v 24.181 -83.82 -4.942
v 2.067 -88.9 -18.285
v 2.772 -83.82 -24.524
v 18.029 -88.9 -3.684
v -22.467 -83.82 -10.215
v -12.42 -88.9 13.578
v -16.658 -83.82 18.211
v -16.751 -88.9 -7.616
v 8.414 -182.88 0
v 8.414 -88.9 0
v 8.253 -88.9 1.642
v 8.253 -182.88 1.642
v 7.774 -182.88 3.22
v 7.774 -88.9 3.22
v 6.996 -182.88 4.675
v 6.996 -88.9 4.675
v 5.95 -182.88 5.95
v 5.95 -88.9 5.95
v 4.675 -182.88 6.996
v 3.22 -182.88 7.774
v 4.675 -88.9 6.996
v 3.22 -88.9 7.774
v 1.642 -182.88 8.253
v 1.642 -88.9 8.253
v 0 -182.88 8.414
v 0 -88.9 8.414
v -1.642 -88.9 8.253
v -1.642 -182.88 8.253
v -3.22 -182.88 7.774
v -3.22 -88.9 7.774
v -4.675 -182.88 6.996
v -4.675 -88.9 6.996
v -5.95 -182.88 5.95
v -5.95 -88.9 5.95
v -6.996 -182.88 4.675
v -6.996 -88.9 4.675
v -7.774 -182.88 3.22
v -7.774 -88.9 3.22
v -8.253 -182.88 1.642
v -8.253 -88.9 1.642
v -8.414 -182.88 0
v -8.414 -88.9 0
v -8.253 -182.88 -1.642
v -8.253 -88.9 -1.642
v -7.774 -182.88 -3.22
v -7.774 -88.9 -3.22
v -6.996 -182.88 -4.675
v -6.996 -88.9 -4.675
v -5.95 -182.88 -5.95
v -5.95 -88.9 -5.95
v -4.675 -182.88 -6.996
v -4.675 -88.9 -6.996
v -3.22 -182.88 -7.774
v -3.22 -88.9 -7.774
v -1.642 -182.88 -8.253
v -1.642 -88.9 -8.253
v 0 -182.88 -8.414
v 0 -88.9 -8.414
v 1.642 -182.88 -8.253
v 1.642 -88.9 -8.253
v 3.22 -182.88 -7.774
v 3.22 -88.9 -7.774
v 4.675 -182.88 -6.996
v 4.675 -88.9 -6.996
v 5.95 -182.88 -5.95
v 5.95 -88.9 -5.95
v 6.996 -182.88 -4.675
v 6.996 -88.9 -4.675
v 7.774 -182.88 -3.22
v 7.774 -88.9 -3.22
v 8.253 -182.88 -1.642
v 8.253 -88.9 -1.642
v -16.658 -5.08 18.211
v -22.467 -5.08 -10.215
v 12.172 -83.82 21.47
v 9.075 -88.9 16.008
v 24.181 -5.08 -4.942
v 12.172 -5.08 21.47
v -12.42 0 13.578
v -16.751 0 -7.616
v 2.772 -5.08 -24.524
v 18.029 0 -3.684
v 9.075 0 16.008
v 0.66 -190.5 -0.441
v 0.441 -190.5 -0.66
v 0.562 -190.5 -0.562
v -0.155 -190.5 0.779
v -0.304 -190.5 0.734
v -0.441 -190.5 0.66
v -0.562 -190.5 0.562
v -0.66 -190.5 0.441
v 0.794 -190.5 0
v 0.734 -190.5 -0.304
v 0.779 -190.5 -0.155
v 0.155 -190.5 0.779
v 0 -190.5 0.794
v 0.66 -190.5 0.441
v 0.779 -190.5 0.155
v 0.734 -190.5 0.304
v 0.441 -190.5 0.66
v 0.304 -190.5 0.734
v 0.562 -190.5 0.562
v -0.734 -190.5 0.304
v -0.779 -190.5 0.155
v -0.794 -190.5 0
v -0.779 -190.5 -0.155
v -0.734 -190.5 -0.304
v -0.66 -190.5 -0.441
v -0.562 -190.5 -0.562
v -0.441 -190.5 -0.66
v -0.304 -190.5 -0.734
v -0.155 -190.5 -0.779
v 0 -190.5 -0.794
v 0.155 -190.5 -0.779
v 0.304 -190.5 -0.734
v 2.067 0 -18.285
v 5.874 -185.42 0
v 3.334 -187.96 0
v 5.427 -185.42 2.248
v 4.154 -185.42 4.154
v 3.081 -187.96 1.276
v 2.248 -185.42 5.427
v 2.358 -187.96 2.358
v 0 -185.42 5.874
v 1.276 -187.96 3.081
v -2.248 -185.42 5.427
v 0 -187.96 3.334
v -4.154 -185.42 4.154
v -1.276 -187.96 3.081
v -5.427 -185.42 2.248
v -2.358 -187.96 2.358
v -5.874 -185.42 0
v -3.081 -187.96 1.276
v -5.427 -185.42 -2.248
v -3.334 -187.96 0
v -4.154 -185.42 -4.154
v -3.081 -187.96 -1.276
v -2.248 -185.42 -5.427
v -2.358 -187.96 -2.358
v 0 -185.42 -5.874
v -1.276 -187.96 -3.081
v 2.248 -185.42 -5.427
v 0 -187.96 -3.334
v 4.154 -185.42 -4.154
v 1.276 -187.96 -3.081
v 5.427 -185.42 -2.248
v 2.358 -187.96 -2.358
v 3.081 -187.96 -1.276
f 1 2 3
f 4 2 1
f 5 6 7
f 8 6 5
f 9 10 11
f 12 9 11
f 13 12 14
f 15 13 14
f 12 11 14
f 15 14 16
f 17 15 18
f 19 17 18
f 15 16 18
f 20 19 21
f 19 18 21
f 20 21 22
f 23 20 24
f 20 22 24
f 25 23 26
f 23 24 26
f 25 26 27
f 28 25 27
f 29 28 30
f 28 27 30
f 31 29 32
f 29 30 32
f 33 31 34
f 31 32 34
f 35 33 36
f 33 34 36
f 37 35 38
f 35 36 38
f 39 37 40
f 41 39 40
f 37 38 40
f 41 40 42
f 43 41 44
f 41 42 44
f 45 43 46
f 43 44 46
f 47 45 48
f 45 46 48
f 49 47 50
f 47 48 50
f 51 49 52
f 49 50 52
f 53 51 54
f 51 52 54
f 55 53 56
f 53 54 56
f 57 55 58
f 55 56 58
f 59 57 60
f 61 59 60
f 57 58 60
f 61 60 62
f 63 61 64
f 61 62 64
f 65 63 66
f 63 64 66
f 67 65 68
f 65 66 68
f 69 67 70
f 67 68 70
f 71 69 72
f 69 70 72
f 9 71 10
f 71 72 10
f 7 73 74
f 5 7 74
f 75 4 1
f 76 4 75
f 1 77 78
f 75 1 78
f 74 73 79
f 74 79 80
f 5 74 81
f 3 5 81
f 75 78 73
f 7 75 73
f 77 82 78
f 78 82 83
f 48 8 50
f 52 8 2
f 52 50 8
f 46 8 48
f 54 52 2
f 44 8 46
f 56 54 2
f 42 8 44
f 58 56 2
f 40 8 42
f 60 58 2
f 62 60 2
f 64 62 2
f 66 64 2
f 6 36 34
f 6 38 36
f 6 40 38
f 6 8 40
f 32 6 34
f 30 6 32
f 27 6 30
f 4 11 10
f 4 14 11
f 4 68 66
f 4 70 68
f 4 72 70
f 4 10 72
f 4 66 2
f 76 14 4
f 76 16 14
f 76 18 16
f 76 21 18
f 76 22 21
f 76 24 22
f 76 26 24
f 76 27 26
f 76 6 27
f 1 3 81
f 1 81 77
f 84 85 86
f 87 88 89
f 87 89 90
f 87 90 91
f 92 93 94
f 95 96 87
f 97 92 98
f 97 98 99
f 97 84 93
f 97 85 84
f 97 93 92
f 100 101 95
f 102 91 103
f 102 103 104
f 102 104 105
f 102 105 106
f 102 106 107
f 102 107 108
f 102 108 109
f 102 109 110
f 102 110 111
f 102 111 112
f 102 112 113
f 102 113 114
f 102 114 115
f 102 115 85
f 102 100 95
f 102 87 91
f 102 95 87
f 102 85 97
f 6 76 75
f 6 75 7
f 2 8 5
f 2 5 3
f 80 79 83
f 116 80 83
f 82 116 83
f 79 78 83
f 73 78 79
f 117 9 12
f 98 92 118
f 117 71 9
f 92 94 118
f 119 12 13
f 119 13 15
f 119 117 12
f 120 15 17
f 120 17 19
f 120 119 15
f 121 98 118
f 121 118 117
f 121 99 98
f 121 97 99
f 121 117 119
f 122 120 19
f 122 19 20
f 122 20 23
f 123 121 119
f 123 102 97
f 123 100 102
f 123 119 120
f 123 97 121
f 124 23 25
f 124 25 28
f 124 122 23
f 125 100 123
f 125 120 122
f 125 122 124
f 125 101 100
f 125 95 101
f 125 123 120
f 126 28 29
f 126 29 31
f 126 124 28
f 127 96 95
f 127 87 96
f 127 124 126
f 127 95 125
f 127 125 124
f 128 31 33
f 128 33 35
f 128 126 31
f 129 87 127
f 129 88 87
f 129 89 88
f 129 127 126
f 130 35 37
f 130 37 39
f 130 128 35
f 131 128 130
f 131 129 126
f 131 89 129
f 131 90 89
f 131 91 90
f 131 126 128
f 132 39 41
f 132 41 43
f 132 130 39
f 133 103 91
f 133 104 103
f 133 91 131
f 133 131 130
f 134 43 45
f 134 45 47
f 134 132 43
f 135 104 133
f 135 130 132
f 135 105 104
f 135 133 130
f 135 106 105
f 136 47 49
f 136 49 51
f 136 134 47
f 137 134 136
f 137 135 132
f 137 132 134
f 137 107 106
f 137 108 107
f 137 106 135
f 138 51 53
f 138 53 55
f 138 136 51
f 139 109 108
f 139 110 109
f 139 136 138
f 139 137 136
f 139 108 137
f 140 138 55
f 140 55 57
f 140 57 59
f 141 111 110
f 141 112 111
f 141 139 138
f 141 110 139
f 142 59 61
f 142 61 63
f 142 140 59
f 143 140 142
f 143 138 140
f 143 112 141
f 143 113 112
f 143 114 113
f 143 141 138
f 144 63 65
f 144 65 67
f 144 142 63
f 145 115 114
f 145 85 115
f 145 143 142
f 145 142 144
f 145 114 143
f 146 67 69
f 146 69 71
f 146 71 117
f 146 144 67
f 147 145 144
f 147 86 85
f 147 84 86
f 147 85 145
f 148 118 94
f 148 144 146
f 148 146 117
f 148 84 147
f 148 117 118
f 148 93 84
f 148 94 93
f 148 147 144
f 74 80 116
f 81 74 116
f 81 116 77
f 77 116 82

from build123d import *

# Parameters (mm, degrees)
F1_DEPTH = 88.9
F2_SIZE  = 5.08
F3_SIZE  = 5.08
F4_SIZE  = 5.08
F5_SIZE  = 5.08
F6_SIZE  = 5.08
F7_SIZE  = 5.08
F8_R     = 8.414365
F9_DEPTH = 101.6
F10_SIZE = 7.62


with BuildPart() as f1:
    # F0 (on Front) → F1 (new body)
    with BuildSketch(Plane.XZ):
        Polygon((-22.467206, -10.215149), (2.772436, -24.524237), (24.180665, -4.941663), (12.172037, 21.470121), (-16.657933, 18.210928), align=None)
    extrude(amount=F1_DEPTH)

    # F2
    f2_edges = [f1.edges().sort_by_distance(p)[0] for p in [
        (-9.847385, -88.9, -17.369693),
    ]]
    chamfer(f2_edges, length=F2_SIZE)

    # F3
    f3_edges = [f1.edges().sort_by_distance(p)[0] for p in [
        (-19.027823, -88.9, 6.614521),
    ]]
    chamfer(f3_edges, length=F3_SIZE)

    # F4
    f4_edges = [f1.edges().sort_by_distance(p)[0] for p in [
        (0.410862, -88.9, 20.140535),
    ]]
    chamfer(f4_edges, length=F4_SIZE)

    # F5
    f5_edges = [f1.edges().sort_by_distance(p)[0] for p in [
        (19.28175, -88.9, 5.833014),
    ]]
    chamfer(f5_edges, length=F5_SIZE)

    # F6
    f6_edges = [f1.edges().sort_by_distance(p)[0] for p in [
        (13.476551, -88.9, -14.73295),
    ]]
    chamfer(f6_edges, length=F6_SIZE)

    # F7
    f7_edges = [f1.edges().sort_by_distance(p)[0] for p in [
        (-19.562569, 0, 3.997889),
        (-2.242948, 0, 19.840525),
        (18.176351, 0, 8.264229),
        (13.476551, 0, -14.73295),
        (-9.847385, 0, -17.369693),
    ]]
    chamfer(f7_edges, length=F7_SIZE)

    # F8 (on face) → F9 (join)
    with BuildSketch(Plane.XZ.offset(88.9)):
        Circle(F8_R)
    extrude(amount=F9_DEPTH)

    # F10
    f10_edges = [f1.edges().sort_by_distance(p)[0] for p in [
        (-8.414365, -190.5, 0),
    ]]
    chamfer(f10_edges, length=F10_SIZE)


solid = f1.part
